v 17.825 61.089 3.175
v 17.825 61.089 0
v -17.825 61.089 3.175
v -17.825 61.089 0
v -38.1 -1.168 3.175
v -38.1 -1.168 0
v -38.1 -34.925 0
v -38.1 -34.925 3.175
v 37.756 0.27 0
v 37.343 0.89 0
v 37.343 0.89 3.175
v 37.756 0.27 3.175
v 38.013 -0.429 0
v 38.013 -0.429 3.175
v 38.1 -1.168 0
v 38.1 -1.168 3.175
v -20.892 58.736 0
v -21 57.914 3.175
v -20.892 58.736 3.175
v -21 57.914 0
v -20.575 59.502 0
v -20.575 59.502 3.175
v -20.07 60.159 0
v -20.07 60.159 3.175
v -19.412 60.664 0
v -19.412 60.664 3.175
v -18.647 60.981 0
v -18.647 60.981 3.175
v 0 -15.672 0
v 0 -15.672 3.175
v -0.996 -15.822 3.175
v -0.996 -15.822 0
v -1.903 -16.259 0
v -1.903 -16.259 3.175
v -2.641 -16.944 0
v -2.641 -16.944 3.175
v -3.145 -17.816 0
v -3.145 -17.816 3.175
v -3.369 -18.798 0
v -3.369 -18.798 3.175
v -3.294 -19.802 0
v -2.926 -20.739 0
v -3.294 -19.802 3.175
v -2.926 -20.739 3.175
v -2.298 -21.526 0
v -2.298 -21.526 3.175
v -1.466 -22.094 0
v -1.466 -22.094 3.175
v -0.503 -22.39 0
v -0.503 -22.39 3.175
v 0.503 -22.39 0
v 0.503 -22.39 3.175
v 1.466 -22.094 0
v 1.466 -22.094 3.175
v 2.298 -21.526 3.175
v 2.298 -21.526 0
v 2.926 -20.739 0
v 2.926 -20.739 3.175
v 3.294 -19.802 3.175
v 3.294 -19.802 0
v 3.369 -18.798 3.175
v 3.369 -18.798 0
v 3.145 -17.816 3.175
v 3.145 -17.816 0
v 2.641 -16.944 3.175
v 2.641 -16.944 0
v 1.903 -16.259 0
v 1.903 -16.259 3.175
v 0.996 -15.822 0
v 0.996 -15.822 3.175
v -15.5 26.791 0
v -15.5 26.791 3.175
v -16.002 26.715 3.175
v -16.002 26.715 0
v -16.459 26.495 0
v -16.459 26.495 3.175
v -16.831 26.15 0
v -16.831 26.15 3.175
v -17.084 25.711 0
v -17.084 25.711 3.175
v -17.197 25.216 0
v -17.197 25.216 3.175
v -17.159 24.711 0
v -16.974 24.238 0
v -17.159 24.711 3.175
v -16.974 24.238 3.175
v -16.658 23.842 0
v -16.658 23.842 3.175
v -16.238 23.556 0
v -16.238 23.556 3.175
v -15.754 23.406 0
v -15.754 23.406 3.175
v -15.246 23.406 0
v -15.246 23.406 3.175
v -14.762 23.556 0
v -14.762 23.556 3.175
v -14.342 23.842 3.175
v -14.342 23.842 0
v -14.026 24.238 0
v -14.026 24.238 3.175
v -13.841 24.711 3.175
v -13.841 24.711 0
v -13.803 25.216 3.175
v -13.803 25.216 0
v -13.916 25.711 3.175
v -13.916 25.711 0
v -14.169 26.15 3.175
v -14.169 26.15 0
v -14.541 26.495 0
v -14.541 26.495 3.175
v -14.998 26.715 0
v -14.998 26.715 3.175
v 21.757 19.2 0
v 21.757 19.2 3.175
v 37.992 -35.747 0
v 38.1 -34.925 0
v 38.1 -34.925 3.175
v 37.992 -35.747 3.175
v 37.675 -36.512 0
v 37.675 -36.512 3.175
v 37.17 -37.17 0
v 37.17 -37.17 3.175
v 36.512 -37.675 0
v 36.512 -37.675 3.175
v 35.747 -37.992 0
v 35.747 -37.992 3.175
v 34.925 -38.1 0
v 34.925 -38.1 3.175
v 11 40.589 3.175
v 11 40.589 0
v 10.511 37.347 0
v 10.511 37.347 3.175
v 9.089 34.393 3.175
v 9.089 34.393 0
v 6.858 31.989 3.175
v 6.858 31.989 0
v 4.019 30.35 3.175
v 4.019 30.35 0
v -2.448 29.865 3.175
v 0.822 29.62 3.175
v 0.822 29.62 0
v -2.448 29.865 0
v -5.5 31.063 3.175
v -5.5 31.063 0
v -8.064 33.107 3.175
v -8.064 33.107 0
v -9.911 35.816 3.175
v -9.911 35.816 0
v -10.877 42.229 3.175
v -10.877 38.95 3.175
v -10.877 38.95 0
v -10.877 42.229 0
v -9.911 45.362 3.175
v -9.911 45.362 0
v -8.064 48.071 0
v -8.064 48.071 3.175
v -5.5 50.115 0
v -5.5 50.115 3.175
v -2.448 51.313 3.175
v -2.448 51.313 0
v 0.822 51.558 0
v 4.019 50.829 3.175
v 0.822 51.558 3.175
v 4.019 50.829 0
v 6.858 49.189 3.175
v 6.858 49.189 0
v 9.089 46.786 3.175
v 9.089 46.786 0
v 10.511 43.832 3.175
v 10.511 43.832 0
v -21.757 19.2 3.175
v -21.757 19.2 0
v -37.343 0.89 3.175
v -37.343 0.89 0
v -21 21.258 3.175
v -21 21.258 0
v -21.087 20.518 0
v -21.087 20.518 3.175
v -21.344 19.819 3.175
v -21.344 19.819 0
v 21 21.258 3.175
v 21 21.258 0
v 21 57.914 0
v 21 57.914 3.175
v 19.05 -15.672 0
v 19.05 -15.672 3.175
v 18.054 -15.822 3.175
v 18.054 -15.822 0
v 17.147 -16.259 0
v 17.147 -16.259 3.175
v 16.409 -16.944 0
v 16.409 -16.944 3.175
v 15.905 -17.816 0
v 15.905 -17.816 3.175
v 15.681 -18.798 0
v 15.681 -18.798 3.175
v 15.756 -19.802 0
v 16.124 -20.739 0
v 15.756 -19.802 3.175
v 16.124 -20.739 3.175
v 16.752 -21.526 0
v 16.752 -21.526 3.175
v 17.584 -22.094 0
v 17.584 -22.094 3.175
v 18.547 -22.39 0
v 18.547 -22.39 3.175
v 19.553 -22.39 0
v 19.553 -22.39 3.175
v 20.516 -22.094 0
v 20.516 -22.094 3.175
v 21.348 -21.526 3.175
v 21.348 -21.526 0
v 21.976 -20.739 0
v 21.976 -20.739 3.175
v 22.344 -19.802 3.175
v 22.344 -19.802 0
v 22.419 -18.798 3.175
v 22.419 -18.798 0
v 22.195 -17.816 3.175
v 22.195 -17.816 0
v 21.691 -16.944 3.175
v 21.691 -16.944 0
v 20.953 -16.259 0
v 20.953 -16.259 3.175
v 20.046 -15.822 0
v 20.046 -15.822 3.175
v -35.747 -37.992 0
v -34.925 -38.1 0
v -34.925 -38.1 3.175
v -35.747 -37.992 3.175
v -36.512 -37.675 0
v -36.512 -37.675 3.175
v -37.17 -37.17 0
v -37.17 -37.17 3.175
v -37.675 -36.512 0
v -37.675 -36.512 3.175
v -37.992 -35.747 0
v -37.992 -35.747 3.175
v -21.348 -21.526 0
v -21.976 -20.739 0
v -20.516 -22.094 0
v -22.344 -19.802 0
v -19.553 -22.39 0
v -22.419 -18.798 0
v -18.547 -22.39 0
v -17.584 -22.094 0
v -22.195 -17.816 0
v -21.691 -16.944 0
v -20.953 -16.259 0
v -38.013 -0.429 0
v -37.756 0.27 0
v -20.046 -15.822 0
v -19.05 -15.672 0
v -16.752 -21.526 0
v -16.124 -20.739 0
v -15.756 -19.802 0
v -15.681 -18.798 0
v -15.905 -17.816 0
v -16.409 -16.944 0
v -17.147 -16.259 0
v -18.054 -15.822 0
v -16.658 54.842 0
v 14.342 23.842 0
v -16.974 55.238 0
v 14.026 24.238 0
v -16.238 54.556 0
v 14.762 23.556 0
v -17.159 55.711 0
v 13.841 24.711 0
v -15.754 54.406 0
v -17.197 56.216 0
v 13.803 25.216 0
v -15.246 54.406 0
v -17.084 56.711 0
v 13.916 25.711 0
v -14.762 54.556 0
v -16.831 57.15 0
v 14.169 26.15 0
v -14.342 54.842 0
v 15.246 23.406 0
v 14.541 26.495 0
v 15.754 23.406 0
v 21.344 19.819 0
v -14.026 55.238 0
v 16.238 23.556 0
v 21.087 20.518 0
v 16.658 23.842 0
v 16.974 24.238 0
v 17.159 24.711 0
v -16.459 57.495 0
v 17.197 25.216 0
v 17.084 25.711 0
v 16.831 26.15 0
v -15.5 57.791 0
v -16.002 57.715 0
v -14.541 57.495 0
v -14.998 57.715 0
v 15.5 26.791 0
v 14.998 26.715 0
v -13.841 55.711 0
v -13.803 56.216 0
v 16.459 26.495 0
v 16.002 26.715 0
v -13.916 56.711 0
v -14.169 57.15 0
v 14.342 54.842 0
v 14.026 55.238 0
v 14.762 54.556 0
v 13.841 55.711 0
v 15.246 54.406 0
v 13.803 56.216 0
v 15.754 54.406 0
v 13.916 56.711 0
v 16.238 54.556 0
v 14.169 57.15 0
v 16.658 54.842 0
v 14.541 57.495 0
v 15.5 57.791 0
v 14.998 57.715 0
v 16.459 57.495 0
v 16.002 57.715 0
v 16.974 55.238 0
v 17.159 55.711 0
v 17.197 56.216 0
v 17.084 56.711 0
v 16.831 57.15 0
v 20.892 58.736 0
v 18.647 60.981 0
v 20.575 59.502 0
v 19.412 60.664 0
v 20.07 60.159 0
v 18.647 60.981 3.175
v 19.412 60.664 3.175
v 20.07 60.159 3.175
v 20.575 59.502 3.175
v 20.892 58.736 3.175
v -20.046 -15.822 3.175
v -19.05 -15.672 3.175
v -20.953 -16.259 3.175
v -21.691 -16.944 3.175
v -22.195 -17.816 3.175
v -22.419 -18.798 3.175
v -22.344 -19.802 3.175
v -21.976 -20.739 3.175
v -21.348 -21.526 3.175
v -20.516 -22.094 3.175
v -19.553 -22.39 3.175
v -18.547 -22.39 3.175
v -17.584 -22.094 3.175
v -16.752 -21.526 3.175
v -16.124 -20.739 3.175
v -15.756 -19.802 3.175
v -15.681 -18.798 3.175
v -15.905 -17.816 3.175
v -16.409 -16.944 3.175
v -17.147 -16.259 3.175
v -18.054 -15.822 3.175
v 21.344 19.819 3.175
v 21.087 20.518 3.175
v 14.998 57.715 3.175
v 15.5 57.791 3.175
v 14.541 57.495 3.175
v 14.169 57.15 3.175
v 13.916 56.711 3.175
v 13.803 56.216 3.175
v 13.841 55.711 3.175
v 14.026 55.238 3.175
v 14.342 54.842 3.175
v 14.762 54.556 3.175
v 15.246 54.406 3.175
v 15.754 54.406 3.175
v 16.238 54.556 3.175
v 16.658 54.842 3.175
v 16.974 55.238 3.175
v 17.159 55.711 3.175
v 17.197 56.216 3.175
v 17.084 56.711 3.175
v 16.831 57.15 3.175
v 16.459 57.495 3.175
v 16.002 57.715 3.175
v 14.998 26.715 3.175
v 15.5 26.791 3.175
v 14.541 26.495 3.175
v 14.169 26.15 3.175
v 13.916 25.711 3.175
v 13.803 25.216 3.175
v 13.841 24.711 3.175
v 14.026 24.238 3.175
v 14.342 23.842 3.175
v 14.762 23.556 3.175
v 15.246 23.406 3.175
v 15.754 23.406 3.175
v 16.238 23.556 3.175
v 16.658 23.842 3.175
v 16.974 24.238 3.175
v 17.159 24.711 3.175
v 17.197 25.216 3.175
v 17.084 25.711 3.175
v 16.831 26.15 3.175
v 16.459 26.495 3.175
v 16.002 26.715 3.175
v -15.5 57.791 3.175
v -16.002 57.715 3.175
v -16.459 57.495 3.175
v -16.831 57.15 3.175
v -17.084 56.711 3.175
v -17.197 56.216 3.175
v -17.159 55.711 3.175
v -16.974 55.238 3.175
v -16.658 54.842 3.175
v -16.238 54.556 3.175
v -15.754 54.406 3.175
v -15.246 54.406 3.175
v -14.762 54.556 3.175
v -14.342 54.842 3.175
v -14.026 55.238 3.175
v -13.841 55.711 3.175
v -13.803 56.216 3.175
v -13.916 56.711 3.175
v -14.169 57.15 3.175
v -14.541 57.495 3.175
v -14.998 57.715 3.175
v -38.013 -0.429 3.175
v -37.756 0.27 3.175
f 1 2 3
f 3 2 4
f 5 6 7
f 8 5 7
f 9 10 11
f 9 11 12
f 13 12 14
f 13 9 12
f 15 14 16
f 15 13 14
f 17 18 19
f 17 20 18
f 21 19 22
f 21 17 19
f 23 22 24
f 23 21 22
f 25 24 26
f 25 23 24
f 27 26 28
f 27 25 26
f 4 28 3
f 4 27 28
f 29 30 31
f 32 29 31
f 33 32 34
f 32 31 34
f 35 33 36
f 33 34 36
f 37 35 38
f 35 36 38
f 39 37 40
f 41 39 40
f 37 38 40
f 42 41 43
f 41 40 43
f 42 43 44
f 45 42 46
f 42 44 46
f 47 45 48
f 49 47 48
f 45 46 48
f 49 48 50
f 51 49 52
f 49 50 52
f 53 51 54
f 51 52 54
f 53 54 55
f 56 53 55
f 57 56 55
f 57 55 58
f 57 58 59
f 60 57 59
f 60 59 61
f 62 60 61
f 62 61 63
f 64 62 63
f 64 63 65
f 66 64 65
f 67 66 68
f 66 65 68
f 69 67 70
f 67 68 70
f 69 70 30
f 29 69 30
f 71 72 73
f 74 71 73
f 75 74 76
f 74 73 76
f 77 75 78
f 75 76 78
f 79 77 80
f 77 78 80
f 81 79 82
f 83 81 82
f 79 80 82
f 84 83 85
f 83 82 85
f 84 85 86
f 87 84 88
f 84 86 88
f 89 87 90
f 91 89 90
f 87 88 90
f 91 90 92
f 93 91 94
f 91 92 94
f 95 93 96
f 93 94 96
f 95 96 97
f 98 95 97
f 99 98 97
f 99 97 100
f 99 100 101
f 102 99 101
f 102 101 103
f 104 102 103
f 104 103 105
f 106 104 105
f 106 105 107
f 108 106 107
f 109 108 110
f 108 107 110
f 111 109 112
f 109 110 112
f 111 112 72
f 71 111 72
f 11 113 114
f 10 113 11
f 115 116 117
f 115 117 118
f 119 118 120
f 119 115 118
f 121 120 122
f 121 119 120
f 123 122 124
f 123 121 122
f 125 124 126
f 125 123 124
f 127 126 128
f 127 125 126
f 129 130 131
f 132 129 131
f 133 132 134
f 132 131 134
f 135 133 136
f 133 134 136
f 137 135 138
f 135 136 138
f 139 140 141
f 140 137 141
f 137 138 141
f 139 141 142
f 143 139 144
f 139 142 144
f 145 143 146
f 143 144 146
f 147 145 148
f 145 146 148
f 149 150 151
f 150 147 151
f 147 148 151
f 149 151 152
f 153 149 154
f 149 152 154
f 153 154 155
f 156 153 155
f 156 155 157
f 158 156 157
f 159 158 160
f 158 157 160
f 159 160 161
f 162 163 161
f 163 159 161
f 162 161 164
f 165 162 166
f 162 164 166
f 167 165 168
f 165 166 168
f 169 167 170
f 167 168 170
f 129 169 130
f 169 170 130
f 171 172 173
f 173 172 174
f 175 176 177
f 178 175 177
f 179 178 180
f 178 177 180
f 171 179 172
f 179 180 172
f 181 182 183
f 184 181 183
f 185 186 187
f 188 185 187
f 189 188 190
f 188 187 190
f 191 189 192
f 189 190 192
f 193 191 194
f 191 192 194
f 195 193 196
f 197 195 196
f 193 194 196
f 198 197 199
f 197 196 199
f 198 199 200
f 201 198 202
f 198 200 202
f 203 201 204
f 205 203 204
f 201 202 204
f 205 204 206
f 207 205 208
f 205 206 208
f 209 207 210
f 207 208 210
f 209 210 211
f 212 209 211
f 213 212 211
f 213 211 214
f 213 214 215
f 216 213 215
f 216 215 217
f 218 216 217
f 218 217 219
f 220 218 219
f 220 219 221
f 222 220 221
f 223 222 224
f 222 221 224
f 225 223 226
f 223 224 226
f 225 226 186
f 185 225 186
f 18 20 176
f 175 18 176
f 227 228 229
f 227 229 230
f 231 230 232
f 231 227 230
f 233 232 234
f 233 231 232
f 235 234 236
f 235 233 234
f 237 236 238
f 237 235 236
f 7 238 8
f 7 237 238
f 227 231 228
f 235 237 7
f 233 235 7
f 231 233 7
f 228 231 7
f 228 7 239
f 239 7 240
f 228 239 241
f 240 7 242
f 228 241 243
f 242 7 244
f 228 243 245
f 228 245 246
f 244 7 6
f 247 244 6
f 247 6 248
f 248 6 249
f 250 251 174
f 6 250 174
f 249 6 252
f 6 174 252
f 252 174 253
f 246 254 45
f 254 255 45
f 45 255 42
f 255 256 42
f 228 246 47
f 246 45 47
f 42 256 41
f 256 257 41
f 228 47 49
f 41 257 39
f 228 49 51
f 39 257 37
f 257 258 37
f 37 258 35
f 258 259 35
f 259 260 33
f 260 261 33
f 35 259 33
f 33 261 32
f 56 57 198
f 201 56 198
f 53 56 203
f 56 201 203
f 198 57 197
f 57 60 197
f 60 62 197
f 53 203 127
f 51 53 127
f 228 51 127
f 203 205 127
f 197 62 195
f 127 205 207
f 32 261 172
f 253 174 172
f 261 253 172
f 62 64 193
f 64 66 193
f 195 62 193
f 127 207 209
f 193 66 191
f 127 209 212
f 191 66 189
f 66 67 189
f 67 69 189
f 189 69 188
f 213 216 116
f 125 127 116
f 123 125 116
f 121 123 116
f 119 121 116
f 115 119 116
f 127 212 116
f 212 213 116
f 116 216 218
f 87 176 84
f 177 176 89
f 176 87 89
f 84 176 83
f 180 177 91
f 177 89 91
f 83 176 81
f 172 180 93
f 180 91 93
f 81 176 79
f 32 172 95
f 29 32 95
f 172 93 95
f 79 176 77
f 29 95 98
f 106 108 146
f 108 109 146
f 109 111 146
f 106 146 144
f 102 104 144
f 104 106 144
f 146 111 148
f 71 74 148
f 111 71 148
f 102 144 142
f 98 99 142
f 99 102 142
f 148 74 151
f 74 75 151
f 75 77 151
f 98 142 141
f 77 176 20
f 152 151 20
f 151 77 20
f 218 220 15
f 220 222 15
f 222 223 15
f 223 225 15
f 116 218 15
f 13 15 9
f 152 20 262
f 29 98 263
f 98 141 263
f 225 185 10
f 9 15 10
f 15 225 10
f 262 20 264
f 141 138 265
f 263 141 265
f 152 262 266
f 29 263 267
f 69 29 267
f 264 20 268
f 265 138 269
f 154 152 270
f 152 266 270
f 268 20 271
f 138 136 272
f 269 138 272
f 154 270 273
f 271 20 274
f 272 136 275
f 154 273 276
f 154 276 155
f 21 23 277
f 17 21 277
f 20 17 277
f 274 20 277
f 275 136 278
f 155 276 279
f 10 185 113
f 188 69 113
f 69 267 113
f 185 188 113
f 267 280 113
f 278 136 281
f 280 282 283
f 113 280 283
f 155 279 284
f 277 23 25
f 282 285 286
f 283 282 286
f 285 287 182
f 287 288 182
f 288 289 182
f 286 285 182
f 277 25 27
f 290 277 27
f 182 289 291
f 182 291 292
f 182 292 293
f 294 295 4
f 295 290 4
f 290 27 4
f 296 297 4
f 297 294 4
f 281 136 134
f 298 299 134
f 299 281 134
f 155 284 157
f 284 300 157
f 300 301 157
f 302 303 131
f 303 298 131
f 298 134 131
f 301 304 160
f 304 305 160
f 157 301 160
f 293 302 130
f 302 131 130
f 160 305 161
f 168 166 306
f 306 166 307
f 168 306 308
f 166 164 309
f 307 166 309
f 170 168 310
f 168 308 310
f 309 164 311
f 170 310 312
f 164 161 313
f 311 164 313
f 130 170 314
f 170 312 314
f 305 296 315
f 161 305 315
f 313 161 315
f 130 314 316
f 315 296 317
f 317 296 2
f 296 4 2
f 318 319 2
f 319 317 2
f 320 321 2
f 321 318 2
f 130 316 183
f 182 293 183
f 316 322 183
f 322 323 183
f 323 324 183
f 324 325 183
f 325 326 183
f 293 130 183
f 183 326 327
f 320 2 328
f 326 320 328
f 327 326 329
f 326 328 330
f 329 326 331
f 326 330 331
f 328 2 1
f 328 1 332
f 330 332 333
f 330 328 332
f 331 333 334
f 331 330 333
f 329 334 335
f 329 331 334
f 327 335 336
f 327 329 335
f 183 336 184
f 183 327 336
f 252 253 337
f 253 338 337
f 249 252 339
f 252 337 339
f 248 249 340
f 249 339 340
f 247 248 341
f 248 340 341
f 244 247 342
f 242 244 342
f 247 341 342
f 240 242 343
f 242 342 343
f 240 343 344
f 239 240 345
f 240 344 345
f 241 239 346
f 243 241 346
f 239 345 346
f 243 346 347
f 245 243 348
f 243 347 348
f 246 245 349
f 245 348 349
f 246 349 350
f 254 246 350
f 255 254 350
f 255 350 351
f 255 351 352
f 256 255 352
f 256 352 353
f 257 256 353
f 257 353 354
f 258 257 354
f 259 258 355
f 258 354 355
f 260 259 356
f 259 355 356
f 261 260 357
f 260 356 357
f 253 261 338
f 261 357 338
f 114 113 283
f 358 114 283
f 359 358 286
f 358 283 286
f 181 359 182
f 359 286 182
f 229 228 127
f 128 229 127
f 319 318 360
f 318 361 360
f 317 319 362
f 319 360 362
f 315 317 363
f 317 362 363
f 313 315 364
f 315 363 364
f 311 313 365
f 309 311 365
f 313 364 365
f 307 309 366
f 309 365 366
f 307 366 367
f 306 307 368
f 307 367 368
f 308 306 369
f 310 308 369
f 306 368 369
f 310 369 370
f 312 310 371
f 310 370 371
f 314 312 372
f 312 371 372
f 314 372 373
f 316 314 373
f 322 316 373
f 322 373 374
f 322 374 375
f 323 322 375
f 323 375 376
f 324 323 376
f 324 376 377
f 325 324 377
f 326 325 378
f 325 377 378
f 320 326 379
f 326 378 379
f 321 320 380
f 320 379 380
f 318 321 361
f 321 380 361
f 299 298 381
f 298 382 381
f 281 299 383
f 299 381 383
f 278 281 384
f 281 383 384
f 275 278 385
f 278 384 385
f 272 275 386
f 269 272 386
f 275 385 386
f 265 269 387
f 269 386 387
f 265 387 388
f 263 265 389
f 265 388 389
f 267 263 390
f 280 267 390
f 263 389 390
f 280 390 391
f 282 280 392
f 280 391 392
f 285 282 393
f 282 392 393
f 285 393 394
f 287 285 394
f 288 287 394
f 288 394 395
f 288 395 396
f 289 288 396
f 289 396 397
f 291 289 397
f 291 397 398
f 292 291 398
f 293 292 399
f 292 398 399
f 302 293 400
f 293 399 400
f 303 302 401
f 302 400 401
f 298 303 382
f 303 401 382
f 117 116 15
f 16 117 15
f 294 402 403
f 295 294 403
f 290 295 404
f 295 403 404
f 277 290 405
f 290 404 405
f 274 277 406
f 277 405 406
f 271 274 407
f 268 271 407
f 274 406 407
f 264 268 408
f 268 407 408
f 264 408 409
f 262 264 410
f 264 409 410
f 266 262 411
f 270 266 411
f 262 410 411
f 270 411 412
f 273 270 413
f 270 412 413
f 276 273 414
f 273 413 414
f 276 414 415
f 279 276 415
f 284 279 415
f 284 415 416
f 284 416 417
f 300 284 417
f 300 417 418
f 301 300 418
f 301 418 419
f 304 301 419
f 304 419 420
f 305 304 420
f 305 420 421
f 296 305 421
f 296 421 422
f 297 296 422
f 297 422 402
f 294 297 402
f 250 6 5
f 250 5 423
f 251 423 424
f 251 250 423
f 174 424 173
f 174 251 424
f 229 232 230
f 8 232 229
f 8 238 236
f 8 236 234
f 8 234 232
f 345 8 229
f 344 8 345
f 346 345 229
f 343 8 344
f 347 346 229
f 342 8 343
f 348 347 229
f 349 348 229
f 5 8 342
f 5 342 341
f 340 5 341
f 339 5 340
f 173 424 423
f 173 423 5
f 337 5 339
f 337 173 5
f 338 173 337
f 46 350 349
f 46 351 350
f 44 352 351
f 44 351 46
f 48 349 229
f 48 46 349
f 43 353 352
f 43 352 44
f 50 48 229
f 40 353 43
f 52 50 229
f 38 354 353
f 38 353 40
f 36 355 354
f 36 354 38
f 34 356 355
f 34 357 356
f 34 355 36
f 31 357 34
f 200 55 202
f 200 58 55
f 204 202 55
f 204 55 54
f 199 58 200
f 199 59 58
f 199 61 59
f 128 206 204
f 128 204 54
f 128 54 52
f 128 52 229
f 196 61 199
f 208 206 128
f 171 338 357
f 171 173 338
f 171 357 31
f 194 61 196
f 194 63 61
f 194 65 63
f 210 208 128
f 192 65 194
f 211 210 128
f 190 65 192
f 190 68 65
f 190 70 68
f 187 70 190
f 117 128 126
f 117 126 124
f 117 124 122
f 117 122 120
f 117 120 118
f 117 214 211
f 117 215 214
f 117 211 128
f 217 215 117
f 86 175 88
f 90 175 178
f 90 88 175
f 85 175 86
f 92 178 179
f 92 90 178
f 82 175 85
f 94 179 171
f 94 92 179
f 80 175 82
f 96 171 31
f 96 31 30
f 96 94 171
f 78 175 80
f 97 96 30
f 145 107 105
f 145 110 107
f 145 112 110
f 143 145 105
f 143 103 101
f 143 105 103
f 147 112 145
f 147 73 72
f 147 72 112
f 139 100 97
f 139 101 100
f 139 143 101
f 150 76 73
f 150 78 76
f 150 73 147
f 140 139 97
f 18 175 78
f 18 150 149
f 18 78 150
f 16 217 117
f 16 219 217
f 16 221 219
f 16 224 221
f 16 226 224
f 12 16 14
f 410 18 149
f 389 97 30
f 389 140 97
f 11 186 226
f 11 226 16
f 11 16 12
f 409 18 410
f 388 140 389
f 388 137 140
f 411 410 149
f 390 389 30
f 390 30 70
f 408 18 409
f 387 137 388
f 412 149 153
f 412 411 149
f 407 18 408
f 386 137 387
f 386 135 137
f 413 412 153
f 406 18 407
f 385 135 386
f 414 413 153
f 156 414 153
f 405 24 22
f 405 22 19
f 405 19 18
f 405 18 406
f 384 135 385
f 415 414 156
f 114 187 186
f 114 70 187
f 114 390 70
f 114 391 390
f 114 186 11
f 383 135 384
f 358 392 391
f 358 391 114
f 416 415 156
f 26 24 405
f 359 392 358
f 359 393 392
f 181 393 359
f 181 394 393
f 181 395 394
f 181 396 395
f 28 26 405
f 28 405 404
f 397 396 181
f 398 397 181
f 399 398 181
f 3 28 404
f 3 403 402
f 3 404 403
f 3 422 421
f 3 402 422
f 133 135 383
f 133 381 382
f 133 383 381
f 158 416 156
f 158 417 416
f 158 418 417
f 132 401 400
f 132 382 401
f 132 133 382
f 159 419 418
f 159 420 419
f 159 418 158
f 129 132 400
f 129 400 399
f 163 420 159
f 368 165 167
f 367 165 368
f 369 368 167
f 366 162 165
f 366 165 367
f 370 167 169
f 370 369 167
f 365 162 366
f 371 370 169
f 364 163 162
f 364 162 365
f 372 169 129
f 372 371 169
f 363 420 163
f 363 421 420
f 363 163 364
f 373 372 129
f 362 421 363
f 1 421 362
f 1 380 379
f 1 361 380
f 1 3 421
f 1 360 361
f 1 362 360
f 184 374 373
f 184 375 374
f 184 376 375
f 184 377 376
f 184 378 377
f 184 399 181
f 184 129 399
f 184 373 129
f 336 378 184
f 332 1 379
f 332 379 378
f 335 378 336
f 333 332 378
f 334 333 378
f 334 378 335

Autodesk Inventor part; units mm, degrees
ref_plane "YZ Plane" through (0, 0, 0) normal (1, 0, 0) x (0, 1, 0)
ref_plane "XZ Plane" through (0, 0, 0) normal (0, 1, 0) x (-1, 0, 0)
ref_plane "XY Plane" through (0, 0, 0) normal (0, 0, 1) x (1, 0, 0)
sketch "Sketch1" plane through (0, 0, 0) normal (0, 0, 1) x (1, 0, 0)
  line L0 (0, 0) -> (0, 40.5892) construction
  line L1 (0, 0) -> (0, -19.05) construction
  circle A0 centre (0, 40.5892) radius 11
  line L2 (-15.5, 25.0892) -> (15.5, 25.0892) construction
  line L3 (15.5, 25.0892) -> (15.5, 56.0892) construction
  line L4 (15.5, 56.0892) -> (-15.5, 56.0892) construction
  line L5 (-15.5, 56.0892) -> (-15.5, 25.0892) construction
  line L6 (-15.5, 25.0892) -> (15.5, 56.0892) construction
  line L7 (15.5, 25.0892) -> (-15.5, 56.0892) construction
  line L8 (-21, 20.0892) -> (21, 20.0892) construction
  line L9 (21, 21.2575) -> (21, 57.9142)
  line L10 (17.825, 61.0892) -> (-17.825, 61.0892)
  line L11 (-21, 57.9142) -> (-21, 21.2575)
  line L12 (-21, 20.0892) -> (21, 61.0892) construction
  line L13 (21, 20.0892) -> (-21, 61.0892) construction
  line L14 (0, -19.05) -> (0, -38.1) construction
  line L15 (19.05, -19.05) -> (38.1, -19.05) construction
  line L16 (-19.05, -19.05) -> (-38.1, -19.05) construction
  line L17 (-34.925, -38.1) -> (34.925, -38.1)
  line L18 (38.1, -34.925) -> (38.1, -1.1683)
  line L19 (38.1, 0) -> (-38.1, 0) construction
  line L20 (-38.1, -1.1683) -> (-38.1, -34.925)
  line L21 (-21.7573, 19.1995) -> (-37.3427, 0.8897)
  line L22 (21.7573, 19.1995) -> (37.3427, 0.8897)
  arc A1 (-17.825, 61.0892) -> (-21, 57.9142) centre (-17.825, 57.9142) ccw
  arc A2 (-21.7573, 19.1995) -> (-21, 21.2575) centre (-24.175, 21.2575) ccw
  arc A3 (21, 21.2575) -> (21.7573, 19.1995) centre (24.175, 21.2575) ccw
  arc A4 (38.1, -1.1683) -> (37.3427, 0.8897) centre (34.925, -1.1683) ccw
  arc A5 (34.925, -38.1) -> (38.1, -34.925) centre (34.925, -34.925) ccw
  arc A6 (-38.1, -34.925) -> (-34.925, -38.1) centre (-34.925, -34.925) ccw
  arc A7 (-37.3427, 0.8897) -> (-38.1, -1.1683) centre (-34.925, -1.1683) ccw
  arc A8 (21, 57.9142) -> (17.825, 61.0892) centre (17.825, 57.9142) ccw
  point P0 (-38.1, -38.1)
  point P1 (38.1, -38.1)
  dimension "d0" = 40.5892
  dimension "d1" = 19.05
  dimension "d2" = 22
  dimension "d3" = 31
  dimension "d4" = 31
  dimension "d5" = 42
  dimension "d6" = 41
  dimension "d10" = 19.05
  dimension "d11" = 19.05
  dimension "d12" = 19.05
  dimension "d13" = 19.05
  dimension "d14" = 19.05
  dimension "d15" = 19.05
  dimension "d16" = 19.05
  dimension "d17" = 76.2
  dimension "d18" = 19.05
  dimension "d19" = 19.05
  dimension "d20" = 38.1
  dimension "d22" = 38.1
  dimension "d23" = 3.175
  dimension "d24" = 3.175
  dimension "d25" = 3.175
extrude "Extrusion1" add sketch "Sketch1" along normal blind 3.175
hole "Hole1" at (0, -19.05, 0) at (0, 40.5892, 0) at (19.05, -19.05, 0) at (-19.05, -19.05, 0) direction (0, 0, 1) diameter 6.7564 end through all clearance for "Flat Head Machine Screw (82)" size "1/4" standard "Ansi Unified Screw Threads"
hole "Hole2" at (-15.5, 56.0892, 0) at (-15.5, 25.0892, 0) at (15.5, 25.0892, 0) at (15.5, 56.0892, 0) direction (0, 0, 1) diameter 3.4036 end through all clearance for "Flat Head Machine Screw" size "M3" standard "Ansi Metric M Profile"
properties part number "y_motor_mount"
